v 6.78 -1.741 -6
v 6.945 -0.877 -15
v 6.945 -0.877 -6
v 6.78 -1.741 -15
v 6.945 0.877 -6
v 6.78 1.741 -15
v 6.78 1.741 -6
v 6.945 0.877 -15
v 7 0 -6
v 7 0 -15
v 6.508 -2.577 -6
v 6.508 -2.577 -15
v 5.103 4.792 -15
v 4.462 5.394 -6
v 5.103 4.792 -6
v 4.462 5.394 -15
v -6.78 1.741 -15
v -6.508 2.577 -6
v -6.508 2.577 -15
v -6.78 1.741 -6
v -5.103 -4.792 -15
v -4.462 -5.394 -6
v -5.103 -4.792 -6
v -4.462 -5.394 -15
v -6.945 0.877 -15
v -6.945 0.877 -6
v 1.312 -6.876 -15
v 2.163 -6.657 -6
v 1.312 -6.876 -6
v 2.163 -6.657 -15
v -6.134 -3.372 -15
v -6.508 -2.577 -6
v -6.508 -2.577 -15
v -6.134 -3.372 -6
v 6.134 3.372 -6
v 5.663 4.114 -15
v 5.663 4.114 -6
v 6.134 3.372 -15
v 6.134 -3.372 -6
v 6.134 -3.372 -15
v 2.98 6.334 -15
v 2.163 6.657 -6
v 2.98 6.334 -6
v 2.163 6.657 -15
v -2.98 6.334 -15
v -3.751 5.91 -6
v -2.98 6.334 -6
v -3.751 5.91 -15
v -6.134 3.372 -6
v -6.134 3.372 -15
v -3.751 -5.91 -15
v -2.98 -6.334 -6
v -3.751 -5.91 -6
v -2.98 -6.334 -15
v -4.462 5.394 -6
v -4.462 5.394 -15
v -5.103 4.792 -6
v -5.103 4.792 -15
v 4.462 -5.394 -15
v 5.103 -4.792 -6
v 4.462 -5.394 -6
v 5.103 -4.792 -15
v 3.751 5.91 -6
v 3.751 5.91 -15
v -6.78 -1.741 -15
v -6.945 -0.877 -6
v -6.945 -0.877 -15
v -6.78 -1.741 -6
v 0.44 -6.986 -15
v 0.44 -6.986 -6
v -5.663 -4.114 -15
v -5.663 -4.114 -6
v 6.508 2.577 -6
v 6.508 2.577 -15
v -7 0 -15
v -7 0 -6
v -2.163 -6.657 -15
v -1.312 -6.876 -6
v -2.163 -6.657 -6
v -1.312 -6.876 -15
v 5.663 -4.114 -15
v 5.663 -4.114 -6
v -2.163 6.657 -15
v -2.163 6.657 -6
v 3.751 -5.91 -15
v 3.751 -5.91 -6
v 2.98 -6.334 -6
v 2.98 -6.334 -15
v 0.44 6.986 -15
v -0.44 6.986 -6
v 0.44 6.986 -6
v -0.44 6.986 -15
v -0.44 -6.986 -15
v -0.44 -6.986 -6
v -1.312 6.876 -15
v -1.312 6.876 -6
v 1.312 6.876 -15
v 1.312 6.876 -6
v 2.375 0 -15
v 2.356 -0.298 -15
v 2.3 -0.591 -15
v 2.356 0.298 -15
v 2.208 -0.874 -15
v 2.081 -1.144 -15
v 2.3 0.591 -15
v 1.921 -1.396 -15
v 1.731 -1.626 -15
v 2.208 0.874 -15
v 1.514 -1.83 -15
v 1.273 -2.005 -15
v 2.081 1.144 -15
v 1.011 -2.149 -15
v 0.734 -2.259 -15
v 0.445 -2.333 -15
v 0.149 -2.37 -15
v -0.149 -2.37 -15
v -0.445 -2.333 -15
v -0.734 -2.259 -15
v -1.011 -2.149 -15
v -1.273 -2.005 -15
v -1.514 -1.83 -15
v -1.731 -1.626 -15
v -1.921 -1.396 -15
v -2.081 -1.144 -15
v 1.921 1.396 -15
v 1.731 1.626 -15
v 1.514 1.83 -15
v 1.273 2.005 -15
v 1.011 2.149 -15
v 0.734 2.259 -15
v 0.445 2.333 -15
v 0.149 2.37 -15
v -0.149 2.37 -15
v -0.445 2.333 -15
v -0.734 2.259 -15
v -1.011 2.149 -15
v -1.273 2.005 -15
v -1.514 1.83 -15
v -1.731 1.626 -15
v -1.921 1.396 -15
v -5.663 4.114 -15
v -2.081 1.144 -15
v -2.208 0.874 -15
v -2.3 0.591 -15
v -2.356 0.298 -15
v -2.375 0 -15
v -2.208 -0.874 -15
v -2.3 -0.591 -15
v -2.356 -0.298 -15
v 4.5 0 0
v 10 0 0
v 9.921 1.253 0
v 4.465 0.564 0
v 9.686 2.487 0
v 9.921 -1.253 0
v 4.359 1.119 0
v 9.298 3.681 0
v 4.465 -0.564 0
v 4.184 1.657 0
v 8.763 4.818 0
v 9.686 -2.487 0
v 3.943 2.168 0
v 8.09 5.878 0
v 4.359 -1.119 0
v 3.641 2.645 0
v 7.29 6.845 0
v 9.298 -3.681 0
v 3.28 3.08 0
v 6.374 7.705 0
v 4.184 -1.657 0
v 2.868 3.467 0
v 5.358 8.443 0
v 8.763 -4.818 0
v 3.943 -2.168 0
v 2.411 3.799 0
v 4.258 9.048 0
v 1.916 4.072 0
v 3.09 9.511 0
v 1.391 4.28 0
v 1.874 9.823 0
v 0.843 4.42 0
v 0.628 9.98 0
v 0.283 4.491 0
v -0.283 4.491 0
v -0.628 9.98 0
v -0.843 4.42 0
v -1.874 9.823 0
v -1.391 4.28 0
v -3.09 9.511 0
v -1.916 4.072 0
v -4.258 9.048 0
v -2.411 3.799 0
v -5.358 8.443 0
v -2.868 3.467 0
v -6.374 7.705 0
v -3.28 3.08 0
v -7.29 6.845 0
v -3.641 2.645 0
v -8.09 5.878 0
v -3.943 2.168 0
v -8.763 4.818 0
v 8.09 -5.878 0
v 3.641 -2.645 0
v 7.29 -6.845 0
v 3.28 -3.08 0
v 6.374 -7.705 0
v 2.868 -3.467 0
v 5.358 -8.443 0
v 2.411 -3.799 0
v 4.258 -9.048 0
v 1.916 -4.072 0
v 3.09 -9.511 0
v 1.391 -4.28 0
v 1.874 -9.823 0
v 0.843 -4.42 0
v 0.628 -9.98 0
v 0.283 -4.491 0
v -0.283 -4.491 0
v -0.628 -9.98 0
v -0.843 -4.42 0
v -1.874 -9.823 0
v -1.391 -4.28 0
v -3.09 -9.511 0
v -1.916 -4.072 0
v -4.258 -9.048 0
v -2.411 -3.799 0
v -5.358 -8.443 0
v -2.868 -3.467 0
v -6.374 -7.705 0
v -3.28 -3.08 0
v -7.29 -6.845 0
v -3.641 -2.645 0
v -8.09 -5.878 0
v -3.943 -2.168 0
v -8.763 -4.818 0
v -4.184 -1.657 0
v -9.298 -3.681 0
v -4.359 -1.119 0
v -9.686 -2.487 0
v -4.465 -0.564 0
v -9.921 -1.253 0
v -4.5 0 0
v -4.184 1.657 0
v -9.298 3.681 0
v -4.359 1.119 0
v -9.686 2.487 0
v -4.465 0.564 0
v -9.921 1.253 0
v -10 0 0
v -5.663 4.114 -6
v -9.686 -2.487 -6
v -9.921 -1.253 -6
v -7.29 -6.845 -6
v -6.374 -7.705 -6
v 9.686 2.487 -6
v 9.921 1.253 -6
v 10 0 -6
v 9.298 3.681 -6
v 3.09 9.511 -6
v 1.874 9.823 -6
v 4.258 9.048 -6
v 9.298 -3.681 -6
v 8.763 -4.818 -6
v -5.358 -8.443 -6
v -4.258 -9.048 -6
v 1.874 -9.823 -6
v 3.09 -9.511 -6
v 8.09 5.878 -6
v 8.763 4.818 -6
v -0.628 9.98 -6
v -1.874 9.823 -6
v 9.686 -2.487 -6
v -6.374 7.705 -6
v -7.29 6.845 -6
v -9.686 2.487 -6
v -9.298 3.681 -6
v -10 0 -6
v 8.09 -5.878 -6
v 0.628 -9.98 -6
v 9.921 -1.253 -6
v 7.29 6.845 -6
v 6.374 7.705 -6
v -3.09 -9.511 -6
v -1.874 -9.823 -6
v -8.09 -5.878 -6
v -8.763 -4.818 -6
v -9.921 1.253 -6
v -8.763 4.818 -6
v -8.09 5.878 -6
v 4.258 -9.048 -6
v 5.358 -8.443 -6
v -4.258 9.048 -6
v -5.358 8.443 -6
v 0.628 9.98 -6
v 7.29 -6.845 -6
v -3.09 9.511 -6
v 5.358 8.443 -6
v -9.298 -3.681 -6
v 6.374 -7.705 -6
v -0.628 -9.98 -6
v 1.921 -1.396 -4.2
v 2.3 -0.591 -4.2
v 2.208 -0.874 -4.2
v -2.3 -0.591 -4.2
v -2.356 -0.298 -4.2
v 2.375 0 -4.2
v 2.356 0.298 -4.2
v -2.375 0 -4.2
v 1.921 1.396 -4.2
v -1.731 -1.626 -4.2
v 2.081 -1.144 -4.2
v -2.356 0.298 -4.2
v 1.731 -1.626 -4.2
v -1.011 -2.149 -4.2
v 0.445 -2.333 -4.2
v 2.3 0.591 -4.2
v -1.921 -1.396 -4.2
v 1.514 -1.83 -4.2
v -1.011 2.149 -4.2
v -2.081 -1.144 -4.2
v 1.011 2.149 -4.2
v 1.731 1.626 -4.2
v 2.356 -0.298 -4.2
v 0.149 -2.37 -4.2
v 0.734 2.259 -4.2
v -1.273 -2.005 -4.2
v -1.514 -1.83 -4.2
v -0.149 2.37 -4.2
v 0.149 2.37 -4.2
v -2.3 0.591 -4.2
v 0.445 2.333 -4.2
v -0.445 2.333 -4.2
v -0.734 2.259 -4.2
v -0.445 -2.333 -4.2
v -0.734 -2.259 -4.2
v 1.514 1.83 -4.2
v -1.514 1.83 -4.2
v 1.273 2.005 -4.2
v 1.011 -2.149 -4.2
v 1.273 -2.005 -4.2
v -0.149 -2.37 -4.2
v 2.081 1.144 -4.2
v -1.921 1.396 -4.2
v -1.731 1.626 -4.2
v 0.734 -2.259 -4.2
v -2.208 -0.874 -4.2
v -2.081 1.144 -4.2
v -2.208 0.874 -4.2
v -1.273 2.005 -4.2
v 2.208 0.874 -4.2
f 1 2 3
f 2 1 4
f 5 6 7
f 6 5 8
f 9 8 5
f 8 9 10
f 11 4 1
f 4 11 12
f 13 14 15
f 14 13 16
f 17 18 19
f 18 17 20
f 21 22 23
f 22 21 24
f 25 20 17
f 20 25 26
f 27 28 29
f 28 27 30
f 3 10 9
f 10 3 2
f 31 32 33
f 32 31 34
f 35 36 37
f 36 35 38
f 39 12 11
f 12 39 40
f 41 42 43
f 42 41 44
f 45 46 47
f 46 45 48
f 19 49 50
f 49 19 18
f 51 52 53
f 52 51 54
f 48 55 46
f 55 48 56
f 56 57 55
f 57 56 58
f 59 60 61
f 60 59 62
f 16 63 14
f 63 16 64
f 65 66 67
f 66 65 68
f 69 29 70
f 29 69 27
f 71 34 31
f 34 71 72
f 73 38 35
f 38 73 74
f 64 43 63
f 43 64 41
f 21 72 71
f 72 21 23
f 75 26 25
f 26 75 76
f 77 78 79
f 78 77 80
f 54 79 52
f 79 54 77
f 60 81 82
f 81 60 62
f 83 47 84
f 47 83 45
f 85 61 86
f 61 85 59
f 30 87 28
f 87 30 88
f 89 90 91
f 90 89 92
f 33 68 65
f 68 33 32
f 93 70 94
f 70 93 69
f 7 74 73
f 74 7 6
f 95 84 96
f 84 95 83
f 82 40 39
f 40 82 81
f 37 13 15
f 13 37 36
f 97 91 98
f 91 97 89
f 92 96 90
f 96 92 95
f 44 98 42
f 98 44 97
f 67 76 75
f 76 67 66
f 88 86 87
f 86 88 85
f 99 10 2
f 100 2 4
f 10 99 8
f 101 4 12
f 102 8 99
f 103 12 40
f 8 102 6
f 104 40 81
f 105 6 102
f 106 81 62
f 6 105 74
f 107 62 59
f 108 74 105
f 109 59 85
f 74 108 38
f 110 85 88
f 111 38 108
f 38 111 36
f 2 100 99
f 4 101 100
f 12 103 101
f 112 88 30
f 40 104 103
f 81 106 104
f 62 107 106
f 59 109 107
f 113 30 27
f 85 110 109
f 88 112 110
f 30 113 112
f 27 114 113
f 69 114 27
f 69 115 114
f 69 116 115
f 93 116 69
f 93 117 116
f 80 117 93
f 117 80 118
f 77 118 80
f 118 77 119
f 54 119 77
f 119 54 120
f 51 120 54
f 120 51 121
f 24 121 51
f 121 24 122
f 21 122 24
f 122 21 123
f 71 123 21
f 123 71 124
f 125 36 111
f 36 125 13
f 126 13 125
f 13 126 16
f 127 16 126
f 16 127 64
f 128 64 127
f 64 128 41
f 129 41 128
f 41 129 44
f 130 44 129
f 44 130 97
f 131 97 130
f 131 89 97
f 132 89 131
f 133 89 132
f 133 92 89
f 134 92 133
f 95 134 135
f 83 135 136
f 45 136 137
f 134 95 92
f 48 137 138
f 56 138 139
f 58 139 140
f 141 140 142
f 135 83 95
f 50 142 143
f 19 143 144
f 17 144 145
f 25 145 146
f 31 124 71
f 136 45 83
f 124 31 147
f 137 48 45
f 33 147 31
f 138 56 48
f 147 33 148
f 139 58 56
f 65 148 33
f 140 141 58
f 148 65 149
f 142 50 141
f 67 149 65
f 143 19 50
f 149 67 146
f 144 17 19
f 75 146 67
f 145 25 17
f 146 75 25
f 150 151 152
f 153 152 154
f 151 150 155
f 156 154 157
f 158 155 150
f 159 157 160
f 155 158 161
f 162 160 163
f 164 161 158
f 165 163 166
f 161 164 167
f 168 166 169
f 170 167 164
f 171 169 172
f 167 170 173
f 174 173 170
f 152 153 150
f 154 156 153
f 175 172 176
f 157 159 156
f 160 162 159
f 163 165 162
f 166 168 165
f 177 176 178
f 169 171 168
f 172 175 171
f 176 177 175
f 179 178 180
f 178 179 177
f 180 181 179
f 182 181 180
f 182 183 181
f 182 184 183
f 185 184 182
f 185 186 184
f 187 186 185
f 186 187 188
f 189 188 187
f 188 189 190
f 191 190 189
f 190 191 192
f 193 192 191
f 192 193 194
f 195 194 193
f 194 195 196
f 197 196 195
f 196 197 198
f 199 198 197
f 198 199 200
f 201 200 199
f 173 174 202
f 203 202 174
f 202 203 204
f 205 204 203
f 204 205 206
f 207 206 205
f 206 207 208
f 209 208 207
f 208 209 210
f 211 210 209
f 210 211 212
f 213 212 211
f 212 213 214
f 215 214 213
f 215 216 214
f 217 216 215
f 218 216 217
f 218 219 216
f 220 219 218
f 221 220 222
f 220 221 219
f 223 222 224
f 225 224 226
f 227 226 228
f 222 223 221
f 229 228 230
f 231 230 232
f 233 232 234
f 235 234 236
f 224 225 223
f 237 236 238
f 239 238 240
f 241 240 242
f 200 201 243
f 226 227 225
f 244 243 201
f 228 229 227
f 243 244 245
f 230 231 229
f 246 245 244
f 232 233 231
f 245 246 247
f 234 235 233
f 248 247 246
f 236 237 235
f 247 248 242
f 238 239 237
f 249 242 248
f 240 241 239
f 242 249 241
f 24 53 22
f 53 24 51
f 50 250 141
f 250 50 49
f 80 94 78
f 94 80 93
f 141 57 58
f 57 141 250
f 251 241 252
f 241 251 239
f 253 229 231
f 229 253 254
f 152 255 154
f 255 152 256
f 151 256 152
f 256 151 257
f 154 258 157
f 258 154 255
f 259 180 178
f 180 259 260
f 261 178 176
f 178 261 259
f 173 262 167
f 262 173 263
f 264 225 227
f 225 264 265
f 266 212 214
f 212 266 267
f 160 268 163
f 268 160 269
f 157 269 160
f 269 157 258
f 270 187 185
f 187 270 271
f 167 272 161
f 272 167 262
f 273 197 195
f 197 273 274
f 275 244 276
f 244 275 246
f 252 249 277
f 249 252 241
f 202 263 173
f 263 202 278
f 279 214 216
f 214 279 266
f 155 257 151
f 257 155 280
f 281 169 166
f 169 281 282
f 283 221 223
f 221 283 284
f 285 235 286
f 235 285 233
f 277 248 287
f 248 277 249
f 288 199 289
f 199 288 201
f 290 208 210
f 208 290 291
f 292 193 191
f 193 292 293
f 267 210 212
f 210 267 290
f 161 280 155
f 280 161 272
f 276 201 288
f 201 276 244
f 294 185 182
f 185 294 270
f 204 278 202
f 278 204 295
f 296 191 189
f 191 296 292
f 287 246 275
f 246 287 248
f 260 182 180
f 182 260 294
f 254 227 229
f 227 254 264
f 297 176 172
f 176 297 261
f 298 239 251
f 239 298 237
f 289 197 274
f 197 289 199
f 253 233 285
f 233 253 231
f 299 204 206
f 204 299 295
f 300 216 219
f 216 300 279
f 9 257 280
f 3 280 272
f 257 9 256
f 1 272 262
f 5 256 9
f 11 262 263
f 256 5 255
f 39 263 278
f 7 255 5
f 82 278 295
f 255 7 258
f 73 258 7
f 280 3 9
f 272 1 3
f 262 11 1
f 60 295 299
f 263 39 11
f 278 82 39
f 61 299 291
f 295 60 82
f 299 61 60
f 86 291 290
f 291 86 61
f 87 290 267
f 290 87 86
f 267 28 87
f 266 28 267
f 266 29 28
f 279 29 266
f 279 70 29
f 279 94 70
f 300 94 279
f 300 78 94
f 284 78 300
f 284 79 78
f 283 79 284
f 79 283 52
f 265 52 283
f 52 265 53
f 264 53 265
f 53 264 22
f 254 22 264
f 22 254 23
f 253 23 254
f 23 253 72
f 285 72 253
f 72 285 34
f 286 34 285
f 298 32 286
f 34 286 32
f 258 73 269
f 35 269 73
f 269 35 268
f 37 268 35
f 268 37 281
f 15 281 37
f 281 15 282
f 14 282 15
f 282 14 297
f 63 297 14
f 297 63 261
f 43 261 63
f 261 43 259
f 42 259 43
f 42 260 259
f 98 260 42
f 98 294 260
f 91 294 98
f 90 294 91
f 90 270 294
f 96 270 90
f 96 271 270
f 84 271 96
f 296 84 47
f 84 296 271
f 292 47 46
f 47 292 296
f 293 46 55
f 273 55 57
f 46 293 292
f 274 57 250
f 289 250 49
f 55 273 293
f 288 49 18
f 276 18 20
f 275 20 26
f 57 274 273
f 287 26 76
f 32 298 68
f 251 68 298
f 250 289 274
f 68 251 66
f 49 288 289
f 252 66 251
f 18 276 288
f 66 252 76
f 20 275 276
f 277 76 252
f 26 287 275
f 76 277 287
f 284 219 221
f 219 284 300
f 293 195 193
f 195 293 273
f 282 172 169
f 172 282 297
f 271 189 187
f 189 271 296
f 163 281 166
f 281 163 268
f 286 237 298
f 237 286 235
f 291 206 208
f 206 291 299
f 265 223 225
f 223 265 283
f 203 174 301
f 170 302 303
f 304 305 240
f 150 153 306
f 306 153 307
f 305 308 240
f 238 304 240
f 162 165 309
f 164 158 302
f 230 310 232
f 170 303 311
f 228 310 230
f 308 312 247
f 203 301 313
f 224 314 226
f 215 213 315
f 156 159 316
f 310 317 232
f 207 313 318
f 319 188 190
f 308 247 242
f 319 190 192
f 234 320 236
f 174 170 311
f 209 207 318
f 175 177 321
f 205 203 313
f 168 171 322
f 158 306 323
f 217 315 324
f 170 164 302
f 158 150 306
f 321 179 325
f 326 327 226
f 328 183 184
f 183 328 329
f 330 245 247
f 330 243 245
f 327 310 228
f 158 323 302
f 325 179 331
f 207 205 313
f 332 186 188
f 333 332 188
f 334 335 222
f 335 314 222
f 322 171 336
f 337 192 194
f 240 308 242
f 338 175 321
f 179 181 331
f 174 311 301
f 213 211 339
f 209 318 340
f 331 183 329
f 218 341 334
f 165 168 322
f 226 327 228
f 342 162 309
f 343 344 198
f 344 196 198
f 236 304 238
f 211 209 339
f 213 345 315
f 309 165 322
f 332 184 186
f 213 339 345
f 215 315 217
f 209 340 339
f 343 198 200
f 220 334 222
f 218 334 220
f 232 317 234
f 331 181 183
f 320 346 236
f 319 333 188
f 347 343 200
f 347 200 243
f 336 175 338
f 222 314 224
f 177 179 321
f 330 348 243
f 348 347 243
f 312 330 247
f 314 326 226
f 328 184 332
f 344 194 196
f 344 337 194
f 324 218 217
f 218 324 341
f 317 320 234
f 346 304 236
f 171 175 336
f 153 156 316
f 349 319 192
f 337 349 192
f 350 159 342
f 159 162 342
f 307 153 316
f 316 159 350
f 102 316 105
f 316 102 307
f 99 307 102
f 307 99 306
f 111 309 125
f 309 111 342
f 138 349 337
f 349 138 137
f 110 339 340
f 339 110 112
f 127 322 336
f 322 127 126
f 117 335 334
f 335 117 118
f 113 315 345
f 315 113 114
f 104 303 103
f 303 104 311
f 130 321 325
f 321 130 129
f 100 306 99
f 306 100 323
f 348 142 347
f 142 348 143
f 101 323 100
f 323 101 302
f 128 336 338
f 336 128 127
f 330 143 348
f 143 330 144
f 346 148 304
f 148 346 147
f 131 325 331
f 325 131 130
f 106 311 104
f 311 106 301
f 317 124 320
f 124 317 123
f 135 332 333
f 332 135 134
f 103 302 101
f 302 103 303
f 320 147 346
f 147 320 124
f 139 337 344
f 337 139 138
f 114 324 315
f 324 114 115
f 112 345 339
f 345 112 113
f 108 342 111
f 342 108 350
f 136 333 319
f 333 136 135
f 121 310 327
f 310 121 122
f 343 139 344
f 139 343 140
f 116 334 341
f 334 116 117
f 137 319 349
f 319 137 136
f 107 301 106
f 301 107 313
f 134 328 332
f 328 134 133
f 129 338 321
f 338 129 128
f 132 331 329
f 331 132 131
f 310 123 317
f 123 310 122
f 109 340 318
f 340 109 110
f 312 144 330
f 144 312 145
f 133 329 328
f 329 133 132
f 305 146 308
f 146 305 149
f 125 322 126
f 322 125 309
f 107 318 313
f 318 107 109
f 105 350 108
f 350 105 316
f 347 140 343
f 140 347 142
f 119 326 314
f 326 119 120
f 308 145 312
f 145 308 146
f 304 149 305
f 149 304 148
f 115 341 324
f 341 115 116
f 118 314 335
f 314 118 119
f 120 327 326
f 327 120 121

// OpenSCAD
$fn = 50;


difference() {
	union() {
		translate(v = [0, 0, -15.0000000000]) {
			cylinder(h = 15, r = 7.0000000000);
		}
		translate(v = [0, 0, -6.0000000000]) {
			cylinder(h = 6, r = 10.0000000000);
		}
	}
	union() {
		translate(v = [0, 0, 0]) {
			rotate(a = [0, 0, 0]) {
				difference() {
					union() {
						#translate(v = [0, 0, -15.0000000000]) {
							cylinder(h = 15, r = 2.2500000000);
						}
						#translate(v = [0, 0, -4.2000000000]) {
							cylinder(h = 4.2000000000, r1 = 2.3750000000, r2 = 4.5000000000);
						}
						#translate(v = [0, 0, -15.0000000000]) {
							cylinder(h = 15, r = 2.3750000000);
						}
						#translate(v = [0, 0, -15.0000000000]) {
							cylinder(h = 15, r = 2.2500000000);
						}
					}
					union();
				}
			}
		}
	}
}
